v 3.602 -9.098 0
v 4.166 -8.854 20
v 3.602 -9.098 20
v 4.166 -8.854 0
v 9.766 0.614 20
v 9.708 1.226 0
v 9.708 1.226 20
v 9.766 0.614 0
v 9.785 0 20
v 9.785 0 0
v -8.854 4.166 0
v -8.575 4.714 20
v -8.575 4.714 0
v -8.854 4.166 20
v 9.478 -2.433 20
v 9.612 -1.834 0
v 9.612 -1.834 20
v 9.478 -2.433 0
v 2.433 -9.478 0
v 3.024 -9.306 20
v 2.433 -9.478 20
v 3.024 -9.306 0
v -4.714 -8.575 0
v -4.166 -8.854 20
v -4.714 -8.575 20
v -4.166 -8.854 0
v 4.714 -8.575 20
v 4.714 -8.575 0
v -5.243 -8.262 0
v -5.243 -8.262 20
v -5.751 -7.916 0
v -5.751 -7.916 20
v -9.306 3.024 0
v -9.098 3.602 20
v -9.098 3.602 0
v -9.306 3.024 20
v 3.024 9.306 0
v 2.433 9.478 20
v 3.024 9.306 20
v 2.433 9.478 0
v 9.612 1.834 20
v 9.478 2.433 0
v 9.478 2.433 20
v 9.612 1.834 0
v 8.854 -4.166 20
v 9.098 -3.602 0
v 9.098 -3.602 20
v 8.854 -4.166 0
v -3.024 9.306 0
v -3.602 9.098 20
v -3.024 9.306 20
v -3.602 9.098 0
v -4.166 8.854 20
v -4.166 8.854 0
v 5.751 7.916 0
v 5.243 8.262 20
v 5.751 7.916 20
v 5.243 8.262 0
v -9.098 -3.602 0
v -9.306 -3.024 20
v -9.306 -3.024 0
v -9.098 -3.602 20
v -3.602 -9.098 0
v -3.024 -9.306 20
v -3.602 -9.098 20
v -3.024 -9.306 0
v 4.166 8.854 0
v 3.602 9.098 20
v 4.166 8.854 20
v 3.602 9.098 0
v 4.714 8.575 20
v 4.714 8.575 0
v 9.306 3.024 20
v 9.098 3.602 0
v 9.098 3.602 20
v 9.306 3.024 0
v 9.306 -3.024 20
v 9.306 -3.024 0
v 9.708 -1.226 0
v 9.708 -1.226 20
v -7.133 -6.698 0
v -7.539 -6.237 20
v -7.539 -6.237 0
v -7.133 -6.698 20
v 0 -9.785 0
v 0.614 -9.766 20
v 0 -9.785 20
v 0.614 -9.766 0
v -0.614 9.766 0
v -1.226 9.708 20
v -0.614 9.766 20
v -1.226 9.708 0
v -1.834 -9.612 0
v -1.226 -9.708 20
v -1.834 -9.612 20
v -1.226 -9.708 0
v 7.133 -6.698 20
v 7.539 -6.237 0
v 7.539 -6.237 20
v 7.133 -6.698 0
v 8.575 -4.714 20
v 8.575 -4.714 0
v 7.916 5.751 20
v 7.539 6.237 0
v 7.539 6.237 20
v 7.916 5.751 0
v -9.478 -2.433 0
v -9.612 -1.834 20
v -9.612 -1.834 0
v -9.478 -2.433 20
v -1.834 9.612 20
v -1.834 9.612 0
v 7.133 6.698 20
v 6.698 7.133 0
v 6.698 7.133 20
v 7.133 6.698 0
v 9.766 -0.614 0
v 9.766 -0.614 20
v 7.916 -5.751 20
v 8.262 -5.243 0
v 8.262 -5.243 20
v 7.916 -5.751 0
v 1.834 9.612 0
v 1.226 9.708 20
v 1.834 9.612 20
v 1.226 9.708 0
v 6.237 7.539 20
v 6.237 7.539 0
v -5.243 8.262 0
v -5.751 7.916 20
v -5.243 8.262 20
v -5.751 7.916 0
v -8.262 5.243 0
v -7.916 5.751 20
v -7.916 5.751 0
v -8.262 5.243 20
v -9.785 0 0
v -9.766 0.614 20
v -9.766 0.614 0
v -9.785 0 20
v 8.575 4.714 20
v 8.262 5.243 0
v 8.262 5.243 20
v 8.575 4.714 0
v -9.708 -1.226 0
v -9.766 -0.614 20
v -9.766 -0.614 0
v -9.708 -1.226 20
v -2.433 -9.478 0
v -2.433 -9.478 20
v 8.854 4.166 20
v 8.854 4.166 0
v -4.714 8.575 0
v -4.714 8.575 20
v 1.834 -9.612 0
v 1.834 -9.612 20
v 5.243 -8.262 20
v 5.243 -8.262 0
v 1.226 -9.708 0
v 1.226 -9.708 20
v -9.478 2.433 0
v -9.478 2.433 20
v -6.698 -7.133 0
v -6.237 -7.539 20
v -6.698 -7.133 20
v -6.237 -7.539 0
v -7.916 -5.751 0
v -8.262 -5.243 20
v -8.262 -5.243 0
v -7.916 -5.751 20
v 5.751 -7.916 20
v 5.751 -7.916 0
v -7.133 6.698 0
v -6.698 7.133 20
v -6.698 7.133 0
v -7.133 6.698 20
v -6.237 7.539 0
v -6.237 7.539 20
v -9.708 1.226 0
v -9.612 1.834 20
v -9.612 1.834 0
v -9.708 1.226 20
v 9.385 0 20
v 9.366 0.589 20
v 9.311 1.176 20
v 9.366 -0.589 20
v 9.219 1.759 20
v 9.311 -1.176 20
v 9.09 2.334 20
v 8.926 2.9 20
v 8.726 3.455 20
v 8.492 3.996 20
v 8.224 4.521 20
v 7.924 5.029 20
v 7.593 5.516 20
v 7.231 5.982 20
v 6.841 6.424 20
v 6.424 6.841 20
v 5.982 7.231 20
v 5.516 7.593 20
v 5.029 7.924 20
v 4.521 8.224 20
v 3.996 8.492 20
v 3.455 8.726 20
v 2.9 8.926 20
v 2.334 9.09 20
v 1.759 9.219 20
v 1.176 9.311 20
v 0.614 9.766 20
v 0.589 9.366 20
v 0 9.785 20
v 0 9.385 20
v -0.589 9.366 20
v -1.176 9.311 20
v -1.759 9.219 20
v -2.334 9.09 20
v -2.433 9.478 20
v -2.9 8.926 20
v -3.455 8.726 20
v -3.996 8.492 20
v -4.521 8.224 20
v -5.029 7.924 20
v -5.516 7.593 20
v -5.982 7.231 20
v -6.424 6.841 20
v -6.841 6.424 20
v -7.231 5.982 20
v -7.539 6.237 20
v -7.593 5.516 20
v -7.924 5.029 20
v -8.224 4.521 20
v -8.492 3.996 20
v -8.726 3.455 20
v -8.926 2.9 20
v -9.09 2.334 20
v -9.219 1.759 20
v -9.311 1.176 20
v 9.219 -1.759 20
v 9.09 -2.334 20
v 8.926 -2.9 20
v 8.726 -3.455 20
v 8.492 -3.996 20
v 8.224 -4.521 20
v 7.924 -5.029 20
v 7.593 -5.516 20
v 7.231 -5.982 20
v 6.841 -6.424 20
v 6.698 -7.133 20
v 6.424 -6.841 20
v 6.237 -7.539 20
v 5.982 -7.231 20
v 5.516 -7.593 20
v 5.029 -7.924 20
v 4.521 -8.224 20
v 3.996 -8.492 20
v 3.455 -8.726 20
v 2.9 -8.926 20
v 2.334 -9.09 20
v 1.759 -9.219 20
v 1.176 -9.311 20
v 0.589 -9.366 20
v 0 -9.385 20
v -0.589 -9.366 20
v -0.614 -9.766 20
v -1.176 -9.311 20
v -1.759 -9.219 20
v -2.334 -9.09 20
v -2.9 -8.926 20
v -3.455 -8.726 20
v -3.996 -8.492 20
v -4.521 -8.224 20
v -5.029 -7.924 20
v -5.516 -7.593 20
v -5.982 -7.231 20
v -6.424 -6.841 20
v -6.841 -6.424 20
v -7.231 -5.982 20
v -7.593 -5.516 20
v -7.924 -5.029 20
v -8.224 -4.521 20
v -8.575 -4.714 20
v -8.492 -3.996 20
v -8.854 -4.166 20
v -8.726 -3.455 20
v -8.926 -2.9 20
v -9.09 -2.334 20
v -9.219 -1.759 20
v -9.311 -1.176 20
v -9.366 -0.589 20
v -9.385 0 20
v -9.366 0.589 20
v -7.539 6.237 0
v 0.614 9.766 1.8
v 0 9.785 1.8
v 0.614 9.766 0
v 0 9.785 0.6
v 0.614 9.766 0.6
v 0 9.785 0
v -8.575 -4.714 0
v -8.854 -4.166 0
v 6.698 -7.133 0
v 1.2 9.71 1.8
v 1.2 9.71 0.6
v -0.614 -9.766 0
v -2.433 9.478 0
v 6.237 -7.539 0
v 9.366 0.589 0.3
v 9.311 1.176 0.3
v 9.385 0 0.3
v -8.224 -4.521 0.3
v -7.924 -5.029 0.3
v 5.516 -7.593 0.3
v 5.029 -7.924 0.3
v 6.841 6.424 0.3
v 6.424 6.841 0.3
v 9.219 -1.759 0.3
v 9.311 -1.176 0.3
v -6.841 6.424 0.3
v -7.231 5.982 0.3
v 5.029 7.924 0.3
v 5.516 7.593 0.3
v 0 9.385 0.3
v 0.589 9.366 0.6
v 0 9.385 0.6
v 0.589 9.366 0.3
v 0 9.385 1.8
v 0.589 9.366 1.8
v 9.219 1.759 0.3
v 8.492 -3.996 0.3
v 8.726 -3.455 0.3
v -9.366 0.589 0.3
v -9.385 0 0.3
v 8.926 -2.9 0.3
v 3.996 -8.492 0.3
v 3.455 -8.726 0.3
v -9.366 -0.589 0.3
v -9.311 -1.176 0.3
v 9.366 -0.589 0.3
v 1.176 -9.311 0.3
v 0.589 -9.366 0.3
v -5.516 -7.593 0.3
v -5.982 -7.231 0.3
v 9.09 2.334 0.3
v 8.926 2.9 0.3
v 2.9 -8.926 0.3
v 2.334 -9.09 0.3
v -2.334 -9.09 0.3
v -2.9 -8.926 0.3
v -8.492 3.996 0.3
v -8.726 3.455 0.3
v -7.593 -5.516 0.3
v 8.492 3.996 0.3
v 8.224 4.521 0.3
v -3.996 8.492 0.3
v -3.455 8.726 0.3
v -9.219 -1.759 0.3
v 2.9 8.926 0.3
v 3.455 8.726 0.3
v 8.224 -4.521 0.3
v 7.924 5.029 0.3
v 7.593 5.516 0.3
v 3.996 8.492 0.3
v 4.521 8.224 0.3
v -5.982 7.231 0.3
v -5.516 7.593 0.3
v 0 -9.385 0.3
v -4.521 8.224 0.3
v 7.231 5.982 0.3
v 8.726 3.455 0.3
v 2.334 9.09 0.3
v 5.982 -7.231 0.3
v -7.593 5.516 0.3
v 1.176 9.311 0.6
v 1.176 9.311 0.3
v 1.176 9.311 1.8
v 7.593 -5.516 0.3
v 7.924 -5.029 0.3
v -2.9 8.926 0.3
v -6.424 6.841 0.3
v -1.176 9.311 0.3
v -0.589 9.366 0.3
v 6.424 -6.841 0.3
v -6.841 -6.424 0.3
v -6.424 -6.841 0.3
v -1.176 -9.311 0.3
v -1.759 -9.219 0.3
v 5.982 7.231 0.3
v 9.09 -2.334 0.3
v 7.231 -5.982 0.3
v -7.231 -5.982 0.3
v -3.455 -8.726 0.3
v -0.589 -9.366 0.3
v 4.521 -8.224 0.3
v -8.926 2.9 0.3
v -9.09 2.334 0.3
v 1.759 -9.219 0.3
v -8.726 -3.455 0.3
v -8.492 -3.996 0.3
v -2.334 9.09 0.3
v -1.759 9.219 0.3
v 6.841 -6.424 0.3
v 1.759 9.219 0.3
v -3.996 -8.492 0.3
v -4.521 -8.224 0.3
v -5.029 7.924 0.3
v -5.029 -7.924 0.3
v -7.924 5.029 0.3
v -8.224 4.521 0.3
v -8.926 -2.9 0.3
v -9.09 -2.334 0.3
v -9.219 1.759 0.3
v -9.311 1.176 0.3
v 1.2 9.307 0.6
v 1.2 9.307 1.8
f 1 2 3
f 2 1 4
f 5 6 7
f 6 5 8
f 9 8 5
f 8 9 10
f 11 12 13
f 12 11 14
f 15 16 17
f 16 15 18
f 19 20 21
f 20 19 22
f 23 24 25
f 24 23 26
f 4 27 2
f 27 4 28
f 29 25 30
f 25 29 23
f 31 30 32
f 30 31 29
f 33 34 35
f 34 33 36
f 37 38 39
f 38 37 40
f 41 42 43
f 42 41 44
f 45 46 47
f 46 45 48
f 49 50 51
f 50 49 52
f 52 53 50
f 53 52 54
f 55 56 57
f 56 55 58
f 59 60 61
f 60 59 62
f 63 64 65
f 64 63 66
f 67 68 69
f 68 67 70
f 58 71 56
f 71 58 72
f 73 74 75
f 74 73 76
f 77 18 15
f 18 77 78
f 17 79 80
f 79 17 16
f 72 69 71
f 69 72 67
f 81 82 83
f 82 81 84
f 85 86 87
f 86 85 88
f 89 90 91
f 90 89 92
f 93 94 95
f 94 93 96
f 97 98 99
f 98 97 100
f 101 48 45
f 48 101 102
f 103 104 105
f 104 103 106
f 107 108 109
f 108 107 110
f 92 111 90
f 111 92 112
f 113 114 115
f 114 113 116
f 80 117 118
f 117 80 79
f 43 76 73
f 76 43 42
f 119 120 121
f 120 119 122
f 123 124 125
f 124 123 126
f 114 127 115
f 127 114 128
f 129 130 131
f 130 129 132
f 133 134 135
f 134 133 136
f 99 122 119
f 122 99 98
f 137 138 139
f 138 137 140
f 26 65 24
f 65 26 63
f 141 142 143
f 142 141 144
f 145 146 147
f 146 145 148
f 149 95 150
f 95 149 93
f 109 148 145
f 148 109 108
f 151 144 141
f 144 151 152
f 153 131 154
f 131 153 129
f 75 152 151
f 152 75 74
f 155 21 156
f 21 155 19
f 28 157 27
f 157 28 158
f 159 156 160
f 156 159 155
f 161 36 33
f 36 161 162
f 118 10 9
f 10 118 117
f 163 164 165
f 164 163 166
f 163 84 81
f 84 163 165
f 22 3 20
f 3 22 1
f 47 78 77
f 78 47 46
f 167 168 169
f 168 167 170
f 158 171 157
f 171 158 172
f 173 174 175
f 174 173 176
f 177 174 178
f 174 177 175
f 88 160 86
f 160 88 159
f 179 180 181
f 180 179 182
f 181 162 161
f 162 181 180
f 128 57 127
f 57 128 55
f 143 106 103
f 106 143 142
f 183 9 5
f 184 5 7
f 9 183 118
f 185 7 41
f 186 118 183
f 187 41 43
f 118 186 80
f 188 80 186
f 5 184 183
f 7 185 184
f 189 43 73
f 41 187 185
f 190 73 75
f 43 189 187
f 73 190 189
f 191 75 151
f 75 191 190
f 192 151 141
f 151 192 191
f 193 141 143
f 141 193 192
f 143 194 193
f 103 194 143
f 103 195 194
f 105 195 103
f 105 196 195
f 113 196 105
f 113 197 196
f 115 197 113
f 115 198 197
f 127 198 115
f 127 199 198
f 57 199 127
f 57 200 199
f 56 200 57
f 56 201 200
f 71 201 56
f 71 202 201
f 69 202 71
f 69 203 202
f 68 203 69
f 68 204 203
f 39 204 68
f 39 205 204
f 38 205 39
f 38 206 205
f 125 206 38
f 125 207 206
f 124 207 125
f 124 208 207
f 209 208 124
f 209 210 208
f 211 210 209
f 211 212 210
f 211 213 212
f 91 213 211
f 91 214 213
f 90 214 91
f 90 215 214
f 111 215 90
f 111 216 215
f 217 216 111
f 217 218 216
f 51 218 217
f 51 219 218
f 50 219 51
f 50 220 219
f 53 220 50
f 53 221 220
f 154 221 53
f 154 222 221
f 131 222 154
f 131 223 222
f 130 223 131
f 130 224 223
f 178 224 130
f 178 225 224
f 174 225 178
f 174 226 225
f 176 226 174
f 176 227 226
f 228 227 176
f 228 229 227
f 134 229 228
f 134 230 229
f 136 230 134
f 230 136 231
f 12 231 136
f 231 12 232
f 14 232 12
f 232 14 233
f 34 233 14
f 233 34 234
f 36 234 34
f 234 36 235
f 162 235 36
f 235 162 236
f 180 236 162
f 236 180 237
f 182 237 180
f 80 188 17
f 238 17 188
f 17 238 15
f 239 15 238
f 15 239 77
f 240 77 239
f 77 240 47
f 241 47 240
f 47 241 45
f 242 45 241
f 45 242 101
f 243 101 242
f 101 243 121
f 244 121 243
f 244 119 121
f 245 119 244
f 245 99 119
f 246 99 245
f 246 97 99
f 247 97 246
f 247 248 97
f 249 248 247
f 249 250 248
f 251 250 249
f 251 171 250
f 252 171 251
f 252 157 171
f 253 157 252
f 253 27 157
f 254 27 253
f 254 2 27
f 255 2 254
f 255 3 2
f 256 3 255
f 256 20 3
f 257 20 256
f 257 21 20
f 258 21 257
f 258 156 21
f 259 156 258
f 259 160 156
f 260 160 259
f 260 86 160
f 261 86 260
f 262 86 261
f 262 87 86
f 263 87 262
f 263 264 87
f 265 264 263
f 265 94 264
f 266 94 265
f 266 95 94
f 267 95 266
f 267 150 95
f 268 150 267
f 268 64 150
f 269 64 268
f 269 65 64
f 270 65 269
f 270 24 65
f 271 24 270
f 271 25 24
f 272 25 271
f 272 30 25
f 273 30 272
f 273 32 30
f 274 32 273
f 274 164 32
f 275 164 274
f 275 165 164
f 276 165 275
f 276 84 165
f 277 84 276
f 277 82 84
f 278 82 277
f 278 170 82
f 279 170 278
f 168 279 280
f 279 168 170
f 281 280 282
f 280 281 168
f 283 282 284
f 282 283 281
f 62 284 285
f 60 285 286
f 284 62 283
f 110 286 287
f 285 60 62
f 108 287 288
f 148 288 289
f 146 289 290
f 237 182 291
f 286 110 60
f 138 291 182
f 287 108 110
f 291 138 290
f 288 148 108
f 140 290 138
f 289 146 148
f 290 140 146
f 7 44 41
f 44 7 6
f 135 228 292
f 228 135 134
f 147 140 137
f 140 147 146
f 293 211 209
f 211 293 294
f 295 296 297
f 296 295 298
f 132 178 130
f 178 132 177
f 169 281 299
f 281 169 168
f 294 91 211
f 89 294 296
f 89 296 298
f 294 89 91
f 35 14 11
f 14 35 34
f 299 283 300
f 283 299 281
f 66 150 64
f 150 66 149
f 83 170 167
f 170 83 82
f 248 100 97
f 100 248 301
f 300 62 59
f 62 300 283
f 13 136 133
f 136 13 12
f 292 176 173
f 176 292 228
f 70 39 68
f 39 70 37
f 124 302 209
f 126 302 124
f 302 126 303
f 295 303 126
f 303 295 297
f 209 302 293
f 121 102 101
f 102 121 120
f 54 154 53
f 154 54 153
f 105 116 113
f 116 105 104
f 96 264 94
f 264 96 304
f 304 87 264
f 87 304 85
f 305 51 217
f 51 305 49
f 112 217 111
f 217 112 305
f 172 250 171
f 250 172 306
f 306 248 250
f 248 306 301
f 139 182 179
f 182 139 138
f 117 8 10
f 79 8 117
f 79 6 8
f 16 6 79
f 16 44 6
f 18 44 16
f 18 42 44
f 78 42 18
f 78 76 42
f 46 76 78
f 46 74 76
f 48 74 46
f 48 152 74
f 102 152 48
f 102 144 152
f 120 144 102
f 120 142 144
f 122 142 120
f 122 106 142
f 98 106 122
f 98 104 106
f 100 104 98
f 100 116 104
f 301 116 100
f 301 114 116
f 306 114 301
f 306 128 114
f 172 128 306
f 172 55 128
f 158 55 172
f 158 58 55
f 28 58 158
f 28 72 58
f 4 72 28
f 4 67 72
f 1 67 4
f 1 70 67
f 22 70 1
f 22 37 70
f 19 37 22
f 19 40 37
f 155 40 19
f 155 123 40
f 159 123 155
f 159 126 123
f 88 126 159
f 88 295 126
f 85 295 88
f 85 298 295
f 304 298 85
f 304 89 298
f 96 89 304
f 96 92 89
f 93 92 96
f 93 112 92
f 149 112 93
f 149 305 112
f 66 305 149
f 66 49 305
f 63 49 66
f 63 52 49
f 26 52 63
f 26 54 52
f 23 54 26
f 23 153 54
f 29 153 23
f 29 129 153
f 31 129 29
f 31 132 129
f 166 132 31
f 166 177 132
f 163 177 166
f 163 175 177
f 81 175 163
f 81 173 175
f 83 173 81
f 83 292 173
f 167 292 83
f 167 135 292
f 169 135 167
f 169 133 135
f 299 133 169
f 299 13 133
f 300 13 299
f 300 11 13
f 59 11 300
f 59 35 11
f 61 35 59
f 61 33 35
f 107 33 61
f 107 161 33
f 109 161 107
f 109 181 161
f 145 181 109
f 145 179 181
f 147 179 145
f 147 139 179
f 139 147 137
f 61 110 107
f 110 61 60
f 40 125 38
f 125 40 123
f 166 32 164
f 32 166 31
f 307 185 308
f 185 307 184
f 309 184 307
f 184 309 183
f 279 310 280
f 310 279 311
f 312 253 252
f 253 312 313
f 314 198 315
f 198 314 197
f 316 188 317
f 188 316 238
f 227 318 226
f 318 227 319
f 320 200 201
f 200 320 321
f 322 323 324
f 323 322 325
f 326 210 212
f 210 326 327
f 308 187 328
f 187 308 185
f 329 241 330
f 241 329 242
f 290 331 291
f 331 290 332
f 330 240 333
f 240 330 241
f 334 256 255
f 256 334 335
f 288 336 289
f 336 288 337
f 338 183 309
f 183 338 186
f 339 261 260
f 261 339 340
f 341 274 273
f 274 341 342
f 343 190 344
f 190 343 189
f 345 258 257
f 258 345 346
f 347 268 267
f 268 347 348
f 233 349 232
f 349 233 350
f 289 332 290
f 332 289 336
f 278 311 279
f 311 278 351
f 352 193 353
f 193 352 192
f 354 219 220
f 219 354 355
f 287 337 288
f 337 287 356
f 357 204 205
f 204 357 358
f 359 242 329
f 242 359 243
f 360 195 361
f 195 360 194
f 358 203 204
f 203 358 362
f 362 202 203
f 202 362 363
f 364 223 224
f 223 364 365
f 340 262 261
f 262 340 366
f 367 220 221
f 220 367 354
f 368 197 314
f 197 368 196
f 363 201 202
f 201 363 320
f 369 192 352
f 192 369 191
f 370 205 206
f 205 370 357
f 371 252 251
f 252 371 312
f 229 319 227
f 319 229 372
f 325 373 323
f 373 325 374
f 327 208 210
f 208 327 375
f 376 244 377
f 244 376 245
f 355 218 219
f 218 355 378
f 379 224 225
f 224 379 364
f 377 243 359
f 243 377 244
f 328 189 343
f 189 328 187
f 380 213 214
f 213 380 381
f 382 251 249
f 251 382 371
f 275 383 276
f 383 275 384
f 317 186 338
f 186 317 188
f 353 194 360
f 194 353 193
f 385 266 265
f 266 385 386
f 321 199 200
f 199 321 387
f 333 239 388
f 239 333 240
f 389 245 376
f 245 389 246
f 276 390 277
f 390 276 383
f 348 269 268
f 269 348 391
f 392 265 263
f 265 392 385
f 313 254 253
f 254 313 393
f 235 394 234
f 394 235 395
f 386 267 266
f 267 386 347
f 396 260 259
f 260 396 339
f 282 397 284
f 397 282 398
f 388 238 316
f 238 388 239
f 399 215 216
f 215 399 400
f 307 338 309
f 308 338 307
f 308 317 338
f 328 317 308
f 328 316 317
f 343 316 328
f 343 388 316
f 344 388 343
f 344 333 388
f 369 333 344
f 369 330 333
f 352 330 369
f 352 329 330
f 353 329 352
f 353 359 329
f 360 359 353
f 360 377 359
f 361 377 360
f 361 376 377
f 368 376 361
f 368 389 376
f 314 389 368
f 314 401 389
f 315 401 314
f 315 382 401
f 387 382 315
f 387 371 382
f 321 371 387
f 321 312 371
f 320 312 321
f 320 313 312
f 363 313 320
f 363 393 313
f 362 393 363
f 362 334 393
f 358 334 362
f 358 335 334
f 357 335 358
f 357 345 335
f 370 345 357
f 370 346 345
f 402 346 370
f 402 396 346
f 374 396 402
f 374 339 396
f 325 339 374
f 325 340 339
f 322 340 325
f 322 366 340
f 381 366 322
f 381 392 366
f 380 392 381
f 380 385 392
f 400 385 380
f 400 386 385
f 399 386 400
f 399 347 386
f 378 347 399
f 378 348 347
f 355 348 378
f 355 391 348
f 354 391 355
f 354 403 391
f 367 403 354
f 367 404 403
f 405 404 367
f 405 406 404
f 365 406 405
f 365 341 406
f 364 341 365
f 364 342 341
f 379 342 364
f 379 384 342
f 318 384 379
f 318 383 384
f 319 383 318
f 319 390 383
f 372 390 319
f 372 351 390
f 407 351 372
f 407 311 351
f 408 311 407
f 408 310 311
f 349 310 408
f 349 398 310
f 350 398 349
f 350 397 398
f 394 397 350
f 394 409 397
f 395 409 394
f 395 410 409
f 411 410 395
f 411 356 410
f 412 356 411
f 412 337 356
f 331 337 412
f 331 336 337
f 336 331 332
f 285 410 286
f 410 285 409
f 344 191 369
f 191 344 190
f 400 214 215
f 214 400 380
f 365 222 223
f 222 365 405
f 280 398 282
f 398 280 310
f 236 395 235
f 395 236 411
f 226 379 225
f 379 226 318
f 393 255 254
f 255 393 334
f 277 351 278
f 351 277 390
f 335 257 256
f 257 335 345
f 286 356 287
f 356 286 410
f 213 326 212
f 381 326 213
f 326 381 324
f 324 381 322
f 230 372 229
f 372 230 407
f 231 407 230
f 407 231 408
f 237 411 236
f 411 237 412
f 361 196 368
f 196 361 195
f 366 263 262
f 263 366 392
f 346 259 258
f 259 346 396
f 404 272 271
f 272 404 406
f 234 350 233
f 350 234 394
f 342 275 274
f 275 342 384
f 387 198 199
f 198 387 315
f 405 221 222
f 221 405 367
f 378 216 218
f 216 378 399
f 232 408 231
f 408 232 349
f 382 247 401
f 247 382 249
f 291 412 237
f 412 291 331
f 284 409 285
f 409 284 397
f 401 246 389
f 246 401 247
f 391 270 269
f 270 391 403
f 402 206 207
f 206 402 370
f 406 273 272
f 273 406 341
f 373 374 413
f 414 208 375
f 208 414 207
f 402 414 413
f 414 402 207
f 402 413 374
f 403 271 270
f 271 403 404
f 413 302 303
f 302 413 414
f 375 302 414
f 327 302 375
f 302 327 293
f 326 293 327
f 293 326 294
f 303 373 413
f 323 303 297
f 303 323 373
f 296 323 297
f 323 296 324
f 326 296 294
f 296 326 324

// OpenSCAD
$fn=100;

dime_dia = 18;

battery18mm = 18.57;
dime_thick = 1.2;

big = dime_dia + 2;

/*
difference()
{
    cylinder(h = dime_thick *2, d= big);
    translate([0, 0, dime_thick/4])
    #cylinder(h = dime_thick *2 , d = dime_dia);

    translate([0, 0, dime_thick/2])
    cube([ dime_thick, big, dime_thick]);
}
*/

difference()
{
    cylinder(h = 20, d= battery18mm + 1);
    translate([0, 0, dime_thick/4])
    #cylinder(h = 20 , d = battery18mm +.2);

    translate([0, 0, dime_thick/2])
    cube([ dime_thick, big, dime_thick]);
}
